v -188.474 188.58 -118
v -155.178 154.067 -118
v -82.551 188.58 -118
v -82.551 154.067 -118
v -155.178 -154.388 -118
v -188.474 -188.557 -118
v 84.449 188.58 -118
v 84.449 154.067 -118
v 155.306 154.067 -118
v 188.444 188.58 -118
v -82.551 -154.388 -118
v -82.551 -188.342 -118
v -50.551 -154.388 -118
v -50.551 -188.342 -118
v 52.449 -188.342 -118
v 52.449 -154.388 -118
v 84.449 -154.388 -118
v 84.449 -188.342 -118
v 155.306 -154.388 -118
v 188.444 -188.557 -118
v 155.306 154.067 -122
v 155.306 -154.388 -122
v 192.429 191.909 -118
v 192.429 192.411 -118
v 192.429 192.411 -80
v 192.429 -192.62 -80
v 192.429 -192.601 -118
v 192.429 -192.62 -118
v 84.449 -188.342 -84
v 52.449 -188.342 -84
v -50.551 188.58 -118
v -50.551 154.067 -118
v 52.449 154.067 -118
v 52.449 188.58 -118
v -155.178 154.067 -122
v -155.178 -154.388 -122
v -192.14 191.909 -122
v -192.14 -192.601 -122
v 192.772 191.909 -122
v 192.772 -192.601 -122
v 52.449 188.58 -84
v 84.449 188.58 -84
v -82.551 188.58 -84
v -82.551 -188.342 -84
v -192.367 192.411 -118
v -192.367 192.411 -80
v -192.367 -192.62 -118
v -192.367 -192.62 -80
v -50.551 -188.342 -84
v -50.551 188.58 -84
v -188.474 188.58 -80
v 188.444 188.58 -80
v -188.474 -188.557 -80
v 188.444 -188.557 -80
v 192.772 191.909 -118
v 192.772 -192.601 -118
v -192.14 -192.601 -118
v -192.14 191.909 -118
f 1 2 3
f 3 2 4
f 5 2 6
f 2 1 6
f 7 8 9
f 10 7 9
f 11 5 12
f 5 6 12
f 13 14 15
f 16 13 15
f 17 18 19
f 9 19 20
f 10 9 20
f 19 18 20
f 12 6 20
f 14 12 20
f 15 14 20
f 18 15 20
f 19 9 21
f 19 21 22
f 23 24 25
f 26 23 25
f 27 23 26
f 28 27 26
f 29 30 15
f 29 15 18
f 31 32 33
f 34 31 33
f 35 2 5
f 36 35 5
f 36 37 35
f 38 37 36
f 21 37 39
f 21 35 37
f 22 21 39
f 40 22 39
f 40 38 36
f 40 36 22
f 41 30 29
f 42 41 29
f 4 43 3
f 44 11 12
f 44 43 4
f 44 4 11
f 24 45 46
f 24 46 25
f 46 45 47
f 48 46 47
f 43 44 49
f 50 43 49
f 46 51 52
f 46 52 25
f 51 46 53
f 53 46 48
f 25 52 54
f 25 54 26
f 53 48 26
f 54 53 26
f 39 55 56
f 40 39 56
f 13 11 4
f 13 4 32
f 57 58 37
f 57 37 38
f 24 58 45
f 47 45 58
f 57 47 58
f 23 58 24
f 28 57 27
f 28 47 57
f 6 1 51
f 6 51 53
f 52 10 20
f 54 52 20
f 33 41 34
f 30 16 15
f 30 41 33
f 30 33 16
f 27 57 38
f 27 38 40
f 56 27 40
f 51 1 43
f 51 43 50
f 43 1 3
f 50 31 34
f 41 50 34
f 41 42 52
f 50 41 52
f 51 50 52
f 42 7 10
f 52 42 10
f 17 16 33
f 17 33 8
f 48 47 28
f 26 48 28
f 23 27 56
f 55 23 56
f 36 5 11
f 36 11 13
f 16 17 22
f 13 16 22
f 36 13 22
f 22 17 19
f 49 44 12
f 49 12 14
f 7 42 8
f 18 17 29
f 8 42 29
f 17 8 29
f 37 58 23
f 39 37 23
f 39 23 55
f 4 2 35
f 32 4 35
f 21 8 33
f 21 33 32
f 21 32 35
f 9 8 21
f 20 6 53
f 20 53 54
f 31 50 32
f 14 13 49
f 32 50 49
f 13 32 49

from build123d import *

# Parameters (mm, degrees)
SKETCH008_W   = 384.79573
SKETCH008_H   = 385.031417
SKETCH008_W_2 = 376.917694
SKETCH008_H_2 = 377.136078
PAD007_DEPTH  = 38
SKETCH007_W   = 32
SKETCH007_H   = 377
PAD006_DEPTH  = 34
SKETCH009_W   = 384.911911
SKETCH009_H   = 384.509689
SKETCH009_W_2 = 310.483261
SKETCH009_H_2 = 308.455338
PAD008_DEPTH  = 4


with BuildPart() as body009:
    # Sketch008 (on Face1 of CopyClone001) → Pad007 (new body)
    with BuildSketch(Plane(origin=(135, 0, -118), x_dir=(1, 0, 0), z_dir=(0, 0, -1))):
        with Locations((-134.968895, 0.104423)):
            Rectangle(SKETCH008_W, SKETCH008_H)
        with Locations((-135.014908, -0.01149)):
            Rectangle(SKETCH008_W_2, SKETCH008_H_2, mode=Mode.SUBTRACT)
    extrude(amount=-PAD007_DEPTH)


with BuildPart() as body07:
    # Sketch007 (on Face1 of CopyPad005) → Pad006 (new body)
    with BuildSketch(Plane(origin=(0, 0, -84), x_dir=(1, 0, 0), z_dir=(0, 0, -1))):
        with Locations((-66.550887, -0.158425)):
            Rectangle(SKETCH007_W, SKETCH007_H)
    extrude(amount=PAD006_DEPTH)


with BuildPart() as body008:
    # Body008 base: copy of body07
    add(body07.part)


with BuildPart() as body008_1:
    # Clone001 placement: moved
    add(body008.part.moved(Location((135, 0, 0))))


with BuildPart() as baseplate:
    # Sketch009 (on Face1 of CopyPad006) → Pad008 (new body)
    with BuildSketch(Plane(origin=(0, 0, -118), x_dir=(1, 0, 0), z_dir=(0, 0, -1))):
        with Locations((0.316445, 0.346092)):
            Rectangle(SKETCH009_W, SKETCH009_H)
        with Locations((0.063926, 0.16024)):
            Rectangle(SKETCH009_W_2, SKETCH009_H_2, mode=Mode.SUBTRACT)
    extrude(amount=PAD008_DEPTH)

    # Boolean001: union Body009, Body008, body07
    add(body009.part)
    add(body008_1.part)
    add(body07.part)


solid = baseplate.part
